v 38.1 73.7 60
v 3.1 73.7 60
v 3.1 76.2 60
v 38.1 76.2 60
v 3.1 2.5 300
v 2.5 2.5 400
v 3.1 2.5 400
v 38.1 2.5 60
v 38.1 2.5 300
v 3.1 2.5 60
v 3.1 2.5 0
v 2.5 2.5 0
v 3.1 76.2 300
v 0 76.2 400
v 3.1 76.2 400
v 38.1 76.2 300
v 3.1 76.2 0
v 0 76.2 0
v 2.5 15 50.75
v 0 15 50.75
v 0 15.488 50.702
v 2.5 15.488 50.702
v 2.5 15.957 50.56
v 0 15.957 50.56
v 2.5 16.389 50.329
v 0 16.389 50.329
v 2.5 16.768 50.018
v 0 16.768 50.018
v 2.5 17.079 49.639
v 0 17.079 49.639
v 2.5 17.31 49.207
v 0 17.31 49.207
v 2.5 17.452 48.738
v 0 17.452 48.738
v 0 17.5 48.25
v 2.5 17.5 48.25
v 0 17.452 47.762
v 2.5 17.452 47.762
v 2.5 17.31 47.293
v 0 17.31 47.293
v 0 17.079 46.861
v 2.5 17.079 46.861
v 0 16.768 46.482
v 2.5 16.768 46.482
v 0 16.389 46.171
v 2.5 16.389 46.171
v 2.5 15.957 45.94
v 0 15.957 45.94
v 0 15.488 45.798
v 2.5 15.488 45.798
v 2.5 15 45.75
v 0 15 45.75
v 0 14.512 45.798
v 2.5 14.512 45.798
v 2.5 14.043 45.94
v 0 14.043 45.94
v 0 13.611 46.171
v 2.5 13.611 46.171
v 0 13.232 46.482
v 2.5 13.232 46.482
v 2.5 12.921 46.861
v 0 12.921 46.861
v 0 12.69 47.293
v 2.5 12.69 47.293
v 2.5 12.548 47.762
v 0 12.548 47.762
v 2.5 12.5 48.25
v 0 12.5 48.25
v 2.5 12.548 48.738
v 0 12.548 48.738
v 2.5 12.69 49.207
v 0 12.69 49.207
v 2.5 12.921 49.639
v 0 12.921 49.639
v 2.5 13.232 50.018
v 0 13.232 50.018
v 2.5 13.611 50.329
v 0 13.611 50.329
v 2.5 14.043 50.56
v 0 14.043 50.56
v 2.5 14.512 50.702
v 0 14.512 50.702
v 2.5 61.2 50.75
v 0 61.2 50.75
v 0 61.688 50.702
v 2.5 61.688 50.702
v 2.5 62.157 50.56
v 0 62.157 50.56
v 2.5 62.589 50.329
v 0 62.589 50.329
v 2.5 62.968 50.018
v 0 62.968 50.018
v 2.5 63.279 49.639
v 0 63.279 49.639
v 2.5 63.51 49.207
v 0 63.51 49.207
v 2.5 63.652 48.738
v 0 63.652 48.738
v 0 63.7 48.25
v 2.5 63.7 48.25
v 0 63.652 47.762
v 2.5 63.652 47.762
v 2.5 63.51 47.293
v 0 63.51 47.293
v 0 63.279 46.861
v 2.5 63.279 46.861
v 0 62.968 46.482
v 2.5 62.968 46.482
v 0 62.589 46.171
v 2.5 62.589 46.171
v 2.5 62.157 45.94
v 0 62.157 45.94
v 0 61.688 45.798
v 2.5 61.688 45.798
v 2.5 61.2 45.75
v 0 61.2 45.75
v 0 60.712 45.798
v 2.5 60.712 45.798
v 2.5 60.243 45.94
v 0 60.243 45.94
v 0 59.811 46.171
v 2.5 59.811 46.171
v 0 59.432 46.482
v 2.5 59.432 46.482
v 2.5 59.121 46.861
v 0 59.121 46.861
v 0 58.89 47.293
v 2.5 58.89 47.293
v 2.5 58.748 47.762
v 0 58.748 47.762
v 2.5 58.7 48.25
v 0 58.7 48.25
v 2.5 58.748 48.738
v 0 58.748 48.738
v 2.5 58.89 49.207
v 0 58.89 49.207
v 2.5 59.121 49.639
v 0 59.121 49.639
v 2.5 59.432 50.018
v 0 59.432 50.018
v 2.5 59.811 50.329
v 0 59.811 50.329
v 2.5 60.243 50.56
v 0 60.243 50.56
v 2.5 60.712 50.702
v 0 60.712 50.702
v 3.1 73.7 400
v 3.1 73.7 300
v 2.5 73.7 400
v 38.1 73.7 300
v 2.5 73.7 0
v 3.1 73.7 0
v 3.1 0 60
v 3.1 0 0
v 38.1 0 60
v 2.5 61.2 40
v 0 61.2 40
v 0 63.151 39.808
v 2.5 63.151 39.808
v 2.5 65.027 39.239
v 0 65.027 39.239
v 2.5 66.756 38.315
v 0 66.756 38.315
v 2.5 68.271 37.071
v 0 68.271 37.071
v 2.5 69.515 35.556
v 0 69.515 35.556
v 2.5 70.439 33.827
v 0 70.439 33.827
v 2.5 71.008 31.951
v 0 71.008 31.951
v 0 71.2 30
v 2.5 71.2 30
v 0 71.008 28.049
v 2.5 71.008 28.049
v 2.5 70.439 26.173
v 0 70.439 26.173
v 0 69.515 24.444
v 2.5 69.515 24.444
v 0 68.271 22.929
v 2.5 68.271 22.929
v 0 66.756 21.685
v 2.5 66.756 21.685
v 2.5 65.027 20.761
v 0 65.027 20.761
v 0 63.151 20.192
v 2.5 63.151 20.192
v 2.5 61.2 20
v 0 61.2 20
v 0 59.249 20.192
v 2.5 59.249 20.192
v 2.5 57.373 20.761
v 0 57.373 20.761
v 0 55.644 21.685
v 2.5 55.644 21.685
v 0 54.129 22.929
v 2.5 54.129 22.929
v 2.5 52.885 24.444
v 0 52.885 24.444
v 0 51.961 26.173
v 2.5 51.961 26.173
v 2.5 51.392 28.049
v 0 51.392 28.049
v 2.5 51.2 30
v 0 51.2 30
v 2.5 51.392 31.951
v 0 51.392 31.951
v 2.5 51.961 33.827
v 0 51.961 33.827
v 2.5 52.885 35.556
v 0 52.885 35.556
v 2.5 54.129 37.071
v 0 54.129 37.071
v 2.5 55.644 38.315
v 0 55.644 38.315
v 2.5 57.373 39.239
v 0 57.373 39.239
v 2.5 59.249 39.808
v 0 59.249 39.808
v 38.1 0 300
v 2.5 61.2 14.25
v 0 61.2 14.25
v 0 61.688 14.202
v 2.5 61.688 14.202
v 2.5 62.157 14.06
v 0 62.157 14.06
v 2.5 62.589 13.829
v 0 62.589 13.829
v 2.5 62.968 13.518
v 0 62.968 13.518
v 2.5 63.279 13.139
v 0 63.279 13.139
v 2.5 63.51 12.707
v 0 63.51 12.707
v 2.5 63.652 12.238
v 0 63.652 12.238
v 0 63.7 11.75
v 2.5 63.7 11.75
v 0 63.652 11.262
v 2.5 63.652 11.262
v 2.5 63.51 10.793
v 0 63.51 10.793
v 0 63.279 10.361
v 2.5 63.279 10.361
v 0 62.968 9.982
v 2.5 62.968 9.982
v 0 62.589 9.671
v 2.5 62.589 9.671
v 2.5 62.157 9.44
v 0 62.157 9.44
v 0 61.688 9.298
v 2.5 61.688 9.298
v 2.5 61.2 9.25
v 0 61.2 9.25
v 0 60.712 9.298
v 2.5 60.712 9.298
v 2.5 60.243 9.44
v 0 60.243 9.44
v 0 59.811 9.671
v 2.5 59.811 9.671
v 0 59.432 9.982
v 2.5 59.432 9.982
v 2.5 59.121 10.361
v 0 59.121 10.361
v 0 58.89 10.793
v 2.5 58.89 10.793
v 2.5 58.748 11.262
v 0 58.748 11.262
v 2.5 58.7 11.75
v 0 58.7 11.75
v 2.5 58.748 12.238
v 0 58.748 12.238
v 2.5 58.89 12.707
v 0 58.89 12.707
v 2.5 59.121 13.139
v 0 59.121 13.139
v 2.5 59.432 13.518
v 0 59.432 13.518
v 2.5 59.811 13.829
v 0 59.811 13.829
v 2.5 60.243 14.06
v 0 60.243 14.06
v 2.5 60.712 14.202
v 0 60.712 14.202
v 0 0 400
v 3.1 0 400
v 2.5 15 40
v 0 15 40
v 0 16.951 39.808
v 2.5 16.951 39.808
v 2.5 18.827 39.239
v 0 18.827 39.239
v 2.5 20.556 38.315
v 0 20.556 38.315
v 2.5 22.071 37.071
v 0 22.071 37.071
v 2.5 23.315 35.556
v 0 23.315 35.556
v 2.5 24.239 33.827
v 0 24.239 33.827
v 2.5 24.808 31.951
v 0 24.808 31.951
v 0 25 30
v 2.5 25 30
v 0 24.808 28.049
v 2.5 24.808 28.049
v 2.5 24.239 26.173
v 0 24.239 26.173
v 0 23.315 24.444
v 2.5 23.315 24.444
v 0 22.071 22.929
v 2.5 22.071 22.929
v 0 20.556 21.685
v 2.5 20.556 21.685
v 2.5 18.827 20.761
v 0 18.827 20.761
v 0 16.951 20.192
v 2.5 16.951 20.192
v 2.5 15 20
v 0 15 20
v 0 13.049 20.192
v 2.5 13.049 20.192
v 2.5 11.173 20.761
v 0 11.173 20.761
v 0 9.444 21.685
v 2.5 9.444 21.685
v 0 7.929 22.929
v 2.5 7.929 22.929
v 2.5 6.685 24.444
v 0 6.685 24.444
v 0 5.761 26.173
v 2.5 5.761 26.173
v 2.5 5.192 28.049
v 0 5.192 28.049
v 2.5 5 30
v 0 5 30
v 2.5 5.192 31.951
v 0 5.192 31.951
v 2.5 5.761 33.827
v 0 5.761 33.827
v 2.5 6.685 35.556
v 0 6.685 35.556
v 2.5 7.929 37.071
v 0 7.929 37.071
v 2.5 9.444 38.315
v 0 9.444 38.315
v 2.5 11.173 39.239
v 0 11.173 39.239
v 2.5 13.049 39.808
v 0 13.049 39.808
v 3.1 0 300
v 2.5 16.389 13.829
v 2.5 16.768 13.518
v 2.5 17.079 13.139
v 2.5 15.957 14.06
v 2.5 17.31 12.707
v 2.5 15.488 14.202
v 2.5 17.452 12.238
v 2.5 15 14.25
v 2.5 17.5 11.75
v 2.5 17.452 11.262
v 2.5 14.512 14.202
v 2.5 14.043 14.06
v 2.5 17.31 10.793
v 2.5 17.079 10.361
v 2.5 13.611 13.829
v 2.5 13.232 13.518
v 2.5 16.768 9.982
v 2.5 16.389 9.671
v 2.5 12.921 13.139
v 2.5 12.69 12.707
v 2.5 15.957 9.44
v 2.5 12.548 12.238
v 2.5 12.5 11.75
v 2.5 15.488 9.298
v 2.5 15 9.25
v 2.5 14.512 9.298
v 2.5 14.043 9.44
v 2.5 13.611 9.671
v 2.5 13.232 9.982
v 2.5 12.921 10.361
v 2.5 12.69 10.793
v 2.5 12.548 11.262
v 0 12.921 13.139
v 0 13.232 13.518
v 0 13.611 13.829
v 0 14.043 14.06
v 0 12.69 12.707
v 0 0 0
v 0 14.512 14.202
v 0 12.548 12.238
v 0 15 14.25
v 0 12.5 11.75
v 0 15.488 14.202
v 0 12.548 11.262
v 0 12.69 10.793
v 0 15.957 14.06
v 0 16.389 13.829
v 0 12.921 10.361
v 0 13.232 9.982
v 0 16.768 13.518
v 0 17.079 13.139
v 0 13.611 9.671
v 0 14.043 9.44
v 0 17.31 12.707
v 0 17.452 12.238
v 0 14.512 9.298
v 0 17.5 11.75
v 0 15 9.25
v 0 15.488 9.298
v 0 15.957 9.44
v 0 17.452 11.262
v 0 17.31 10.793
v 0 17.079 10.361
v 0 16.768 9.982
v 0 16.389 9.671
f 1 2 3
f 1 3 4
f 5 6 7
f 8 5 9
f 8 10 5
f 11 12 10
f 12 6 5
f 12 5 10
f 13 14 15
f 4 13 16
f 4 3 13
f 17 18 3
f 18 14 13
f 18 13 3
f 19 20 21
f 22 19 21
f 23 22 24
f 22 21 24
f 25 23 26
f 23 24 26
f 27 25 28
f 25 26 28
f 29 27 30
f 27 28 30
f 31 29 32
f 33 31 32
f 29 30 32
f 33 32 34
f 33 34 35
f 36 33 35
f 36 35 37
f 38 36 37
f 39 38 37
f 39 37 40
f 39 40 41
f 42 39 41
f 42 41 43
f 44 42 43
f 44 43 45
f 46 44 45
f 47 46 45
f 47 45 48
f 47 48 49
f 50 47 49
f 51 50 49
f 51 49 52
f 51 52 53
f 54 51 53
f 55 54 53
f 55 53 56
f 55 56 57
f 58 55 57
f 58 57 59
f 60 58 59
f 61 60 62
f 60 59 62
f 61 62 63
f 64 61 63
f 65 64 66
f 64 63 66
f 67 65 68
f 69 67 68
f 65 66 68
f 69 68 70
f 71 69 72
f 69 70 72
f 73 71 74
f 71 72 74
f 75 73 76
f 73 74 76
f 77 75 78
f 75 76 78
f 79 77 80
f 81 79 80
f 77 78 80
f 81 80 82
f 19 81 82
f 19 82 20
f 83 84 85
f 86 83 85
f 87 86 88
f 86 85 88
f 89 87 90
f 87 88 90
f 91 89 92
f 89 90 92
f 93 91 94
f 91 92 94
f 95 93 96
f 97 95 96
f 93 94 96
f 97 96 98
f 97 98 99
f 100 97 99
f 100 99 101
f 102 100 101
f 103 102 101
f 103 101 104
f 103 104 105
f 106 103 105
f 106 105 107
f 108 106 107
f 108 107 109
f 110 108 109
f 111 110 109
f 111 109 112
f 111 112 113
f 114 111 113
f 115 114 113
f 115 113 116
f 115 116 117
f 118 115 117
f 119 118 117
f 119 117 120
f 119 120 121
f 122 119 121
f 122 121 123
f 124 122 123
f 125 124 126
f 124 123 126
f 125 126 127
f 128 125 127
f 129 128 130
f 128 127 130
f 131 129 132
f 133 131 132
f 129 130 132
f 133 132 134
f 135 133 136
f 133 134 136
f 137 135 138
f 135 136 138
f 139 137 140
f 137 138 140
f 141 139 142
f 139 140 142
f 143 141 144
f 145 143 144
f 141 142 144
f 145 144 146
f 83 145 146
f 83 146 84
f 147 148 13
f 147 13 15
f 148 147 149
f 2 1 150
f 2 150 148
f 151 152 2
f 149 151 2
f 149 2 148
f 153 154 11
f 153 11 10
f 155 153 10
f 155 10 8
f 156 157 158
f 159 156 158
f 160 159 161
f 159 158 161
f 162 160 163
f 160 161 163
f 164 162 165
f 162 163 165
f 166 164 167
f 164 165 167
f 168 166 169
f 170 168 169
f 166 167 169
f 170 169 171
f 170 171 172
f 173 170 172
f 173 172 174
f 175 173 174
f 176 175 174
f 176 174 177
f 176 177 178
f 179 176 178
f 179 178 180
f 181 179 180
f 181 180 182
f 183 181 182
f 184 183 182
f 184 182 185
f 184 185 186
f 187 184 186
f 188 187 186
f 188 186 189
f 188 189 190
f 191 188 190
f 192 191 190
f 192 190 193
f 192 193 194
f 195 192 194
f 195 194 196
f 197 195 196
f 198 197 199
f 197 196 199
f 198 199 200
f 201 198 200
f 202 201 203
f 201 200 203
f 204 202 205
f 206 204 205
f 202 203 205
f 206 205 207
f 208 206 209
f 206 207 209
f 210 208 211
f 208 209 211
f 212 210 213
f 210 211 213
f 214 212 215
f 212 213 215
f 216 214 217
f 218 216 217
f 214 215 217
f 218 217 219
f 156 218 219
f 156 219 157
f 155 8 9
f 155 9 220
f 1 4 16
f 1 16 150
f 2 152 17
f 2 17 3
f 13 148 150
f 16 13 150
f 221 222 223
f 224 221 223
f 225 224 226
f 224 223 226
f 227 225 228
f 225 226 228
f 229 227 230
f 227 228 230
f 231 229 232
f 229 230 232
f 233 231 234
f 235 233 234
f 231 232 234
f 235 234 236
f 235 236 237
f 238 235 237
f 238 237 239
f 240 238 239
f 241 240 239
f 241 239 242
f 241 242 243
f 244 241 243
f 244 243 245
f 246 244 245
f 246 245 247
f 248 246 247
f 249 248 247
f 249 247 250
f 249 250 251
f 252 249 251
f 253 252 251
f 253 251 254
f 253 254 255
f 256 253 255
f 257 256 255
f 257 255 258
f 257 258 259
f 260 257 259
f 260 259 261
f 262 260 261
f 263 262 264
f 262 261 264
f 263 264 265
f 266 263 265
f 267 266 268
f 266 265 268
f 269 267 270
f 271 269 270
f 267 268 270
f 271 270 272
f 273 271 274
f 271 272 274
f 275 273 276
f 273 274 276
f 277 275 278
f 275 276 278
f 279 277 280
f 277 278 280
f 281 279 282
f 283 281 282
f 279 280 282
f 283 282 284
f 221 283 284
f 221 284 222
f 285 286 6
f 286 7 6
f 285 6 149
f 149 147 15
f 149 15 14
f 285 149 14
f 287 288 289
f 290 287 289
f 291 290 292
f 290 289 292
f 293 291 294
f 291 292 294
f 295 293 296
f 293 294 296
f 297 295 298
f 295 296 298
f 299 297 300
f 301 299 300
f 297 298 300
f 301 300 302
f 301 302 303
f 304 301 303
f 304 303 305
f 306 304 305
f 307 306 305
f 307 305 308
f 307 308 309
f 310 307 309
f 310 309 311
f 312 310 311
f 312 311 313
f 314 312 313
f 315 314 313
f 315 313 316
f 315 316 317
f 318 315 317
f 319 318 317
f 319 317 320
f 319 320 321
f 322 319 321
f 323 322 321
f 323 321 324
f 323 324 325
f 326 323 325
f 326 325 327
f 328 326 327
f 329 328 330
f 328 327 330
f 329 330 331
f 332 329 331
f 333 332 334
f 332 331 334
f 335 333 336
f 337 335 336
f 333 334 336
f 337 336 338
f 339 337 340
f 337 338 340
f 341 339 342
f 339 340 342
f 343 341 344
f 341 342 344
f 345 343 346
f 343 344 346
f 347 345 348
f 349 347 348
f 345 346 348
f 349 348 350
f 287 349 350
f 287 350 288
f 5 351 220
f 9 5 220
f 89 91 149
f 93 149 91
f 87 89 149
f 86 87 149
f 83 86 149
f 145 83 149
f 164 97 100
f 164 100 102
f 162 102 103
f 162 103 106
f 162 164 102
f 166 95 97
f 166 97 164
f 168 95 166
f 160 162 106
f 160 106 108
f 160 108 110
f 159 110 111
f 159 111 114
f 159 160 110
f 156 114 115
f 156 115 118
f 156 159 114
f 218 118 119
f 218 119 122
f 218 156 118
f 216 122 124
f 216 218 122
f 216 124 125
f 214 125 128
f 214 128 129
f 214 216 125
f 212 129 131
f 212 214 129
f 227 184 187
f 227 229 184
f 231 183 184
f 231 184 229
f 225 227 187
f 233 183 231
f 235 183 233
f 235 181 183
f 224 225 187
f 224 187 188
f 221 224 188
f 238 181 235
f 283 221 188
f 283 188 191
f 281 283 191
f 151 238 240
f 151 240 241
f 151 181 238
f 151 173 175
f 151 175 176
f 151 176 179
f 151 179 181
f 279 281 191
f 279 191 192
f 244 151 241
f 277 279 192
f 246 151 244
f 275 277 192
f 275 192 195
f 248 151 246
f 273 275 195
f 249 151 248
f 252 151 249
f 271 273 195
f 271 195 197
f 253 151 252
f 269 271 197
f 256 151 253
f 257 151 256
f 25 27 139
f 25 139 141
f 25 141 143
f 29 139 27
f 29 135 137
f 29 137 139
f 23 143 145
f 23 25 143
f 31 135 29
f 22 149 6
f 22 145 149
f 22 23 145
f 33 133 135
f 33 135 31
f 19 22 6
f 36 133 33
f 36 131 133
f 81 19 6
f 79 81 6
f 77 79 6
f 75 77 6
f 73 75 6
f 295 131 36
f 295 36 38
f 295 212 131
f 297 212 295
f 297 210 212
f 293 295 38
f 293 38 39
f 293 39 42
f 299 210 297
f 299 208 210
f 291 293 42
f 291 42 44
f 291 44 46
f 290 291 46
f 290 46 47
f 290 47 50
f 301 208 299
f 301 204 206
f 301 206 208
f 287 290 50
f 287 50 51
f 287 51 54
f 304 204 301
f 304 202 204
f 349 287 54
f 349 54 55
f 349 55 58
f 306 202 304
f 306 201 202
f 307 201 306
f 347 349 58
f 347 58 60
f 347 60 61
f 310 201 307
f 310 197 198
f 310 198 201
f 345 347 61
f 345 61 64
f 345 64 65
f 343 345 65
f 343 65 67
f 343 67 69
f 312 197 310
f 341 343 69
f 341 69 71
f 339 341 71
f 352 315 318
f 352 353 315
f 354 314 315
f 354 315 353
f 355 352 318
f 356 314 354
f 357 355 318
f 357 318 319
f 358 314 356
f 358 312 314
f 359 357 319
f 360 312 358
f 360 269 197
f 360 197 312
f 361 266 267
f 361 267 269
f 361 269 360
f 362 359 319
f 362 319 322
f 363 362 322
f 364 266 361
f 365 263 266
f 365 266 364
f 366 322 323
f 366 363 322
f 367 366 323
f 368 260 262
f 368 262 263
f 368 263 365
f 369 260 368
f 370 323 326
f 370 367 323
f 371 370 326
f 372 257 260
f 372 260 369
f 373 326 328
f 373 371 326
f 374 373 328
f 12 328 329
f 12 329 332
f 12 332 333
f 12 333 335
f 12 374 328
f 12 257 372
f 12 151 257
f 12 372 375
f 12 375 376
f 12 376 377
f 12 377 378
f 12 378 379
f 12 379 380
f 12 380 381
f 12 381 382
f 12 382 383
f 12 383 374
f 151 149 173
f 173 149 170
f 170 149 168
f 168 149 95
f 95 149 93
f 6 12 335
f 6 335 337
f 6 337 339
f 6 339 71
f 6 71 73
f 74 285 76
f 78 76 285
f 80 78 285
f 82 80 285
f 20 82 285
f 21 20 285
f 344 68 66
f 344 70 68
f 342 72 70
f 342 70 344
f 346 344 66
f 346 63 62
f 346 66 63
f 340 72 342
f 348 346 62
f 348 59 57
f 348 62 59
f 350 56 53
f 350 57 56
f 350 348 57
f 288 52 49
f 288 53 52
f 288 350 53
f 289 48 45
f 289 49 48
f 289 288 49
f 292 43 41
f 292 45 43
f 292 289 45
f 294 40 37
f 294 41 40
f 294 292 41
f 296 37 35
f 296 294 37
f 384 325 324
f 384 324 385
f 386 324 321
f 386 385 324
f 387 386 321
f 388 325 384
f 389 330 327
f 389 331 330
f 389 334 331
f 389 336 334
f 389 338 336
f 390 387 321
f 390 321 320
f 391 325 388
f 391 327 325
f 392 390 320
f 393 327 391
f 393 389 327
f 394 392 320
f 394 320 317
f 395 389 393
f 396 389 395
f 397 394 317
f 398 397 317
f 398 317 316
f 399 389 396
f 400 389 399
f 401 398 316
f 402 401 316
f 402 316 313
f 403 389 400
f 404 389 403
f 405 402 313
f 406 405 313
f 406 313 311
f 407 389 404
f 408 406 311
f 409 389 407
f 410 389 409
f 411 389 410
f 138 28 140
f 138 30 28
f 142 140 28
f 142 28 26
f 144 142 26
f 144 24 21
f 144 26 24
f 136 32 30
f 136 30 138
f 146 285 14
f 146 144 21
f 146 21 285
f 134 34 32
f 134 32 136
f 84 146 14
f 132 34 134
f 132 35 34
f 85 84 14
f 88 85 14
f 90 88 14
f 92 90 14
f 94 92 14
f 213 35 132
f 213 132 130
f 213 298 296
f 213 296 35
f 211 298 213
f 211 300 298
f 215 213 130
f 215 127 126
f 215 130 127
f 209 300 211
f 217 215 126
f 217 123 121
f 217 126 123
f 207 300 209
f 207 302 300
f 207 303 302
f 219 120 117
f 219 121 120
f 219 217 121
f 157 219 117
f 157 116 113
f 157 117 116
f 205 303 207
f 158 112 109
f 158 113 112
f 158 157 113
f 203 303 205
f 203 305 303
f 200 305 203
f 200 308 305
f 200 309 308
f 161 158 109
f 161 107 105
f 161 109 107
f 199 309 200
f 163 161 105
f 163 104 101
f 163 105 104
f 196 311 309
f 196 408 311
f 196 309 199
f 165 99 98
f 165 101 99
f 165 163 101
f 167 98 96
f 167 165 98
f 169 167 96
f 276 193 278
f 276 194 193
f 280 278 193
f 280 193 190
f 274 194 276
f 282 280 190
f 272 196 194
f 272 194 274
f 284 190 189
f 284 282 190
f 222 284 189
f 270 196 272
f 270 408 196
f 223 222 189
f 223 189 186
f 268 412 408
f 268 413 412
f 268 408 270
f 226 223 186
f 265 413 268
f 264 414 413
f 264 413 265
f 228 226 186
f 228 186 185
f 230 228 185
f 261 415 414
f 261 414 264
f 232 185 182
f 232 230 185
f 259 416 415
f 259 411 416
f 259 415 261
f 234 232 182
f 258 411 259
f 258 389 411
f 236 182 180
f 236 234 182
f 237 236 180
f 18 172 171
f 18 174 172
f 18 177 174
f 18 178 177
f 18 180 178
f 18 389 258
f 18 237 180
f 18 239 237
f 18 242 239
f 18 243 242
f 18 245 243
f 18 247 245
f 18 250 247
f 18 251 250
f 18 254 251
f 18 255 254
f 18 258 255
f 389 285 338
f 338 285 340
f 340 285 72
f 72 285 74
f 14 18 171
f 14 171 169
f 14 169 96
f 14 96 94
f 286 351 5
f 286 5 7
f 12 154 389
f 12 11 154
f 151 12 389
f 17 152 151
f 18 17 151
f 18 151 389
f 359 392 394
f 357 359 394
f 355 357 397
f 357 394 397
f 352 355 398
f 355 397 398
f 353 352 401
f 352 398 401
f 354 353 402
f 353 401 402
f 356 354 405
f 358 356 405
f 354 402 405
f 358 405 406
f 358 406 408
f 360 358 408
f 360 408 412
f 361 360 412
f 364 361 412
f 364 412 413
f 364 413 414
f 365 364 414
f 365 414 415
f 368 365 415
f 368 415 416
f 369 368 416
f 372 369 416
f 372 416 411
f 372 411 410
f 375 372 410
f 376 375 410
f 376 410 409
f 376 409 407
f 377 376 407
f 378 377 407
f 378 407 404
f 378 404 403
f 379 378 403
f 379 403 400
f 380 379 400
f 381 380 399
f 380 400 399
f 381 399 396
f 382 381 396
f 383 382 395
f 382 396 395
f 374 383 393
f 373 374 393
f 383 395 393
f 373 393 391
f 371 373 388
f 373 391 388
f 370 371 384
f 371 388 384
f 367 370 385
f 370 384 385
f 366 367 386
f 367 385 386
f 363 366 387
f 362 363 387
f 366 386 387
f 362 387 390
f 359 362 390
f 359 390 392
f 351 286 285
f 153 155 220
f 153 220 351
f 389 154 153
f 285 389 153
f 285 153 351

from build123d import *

# Parameters (mm, degrees)
RESSALTO_EXTRUS_O1_DEPTH = 400
ESBO_O3_R                = 10
ESBO_O3_R_2              = 2.5
CORTE_EXTRUS_O1_DEPTH    = 409.971942803
ESBO_O4_W                = 35
ESBO_O4_H                = 60
ESBO_O4_H_2              = 100
CORTE_EXTRUS_O2_DEPTH    = 409.971942803


with BuildPart() as part:
    # Esboço2 → Ressalto-extrusão1 (new body)
    with BuildSketch(Plane.XY):
        Polygon((0, 0), (0, 76.2), (38.1, 76.2), (38.1, 73.7), (2.5, 73.7), (2.5, 2.5), (38.1, 2.5), (38.1, 0), align=None)
    extrude(amount=RESSALTO_EXTRUS_O1_DEPTH)

    # Esboço3 → Corte-extrusão1 (cut, through all)
    with BuildSketch(Plane.ZY):
        with Locations((30, 15)):
            Circle(ESBO_O3_R)
        with Locations((30, 61.2)):
            Circle(ESBO_O3_R)
        with Locations((11.75, 15)):
            Circle(ESBO_O3_R_2)
        with Locations((48.25, 15)):
            Circle(ESBO_O3_R_2)
        with Locations((48.25, 61.2)):
            Circle(ESBO_O3_R_2)
        with Locations((11.75, 61.2)):
            Circle(ESBO_O3_R_2)
    extrude(amount=-CORTE_EXTRUS_O1_DEPTH, mode=Mode.SUBTRACT)

    # Esboço4 → Corte-extrusão2 (cut, through all)
    with BuildSketch(Plane.XZ):
        with Locations((20.6, 30)):
            Rectangle(ESBO_O4_W, ESBO_O4_H)
        with Locations((20.6, 350)):
            Rectangle(ESBO_O4_W, ESBO_O4_H_2)
    extrude(amount=-CORTE_EXTRUS_O2_DEPTH, mode=Mode.SUBTRACT)


solid = part.part
